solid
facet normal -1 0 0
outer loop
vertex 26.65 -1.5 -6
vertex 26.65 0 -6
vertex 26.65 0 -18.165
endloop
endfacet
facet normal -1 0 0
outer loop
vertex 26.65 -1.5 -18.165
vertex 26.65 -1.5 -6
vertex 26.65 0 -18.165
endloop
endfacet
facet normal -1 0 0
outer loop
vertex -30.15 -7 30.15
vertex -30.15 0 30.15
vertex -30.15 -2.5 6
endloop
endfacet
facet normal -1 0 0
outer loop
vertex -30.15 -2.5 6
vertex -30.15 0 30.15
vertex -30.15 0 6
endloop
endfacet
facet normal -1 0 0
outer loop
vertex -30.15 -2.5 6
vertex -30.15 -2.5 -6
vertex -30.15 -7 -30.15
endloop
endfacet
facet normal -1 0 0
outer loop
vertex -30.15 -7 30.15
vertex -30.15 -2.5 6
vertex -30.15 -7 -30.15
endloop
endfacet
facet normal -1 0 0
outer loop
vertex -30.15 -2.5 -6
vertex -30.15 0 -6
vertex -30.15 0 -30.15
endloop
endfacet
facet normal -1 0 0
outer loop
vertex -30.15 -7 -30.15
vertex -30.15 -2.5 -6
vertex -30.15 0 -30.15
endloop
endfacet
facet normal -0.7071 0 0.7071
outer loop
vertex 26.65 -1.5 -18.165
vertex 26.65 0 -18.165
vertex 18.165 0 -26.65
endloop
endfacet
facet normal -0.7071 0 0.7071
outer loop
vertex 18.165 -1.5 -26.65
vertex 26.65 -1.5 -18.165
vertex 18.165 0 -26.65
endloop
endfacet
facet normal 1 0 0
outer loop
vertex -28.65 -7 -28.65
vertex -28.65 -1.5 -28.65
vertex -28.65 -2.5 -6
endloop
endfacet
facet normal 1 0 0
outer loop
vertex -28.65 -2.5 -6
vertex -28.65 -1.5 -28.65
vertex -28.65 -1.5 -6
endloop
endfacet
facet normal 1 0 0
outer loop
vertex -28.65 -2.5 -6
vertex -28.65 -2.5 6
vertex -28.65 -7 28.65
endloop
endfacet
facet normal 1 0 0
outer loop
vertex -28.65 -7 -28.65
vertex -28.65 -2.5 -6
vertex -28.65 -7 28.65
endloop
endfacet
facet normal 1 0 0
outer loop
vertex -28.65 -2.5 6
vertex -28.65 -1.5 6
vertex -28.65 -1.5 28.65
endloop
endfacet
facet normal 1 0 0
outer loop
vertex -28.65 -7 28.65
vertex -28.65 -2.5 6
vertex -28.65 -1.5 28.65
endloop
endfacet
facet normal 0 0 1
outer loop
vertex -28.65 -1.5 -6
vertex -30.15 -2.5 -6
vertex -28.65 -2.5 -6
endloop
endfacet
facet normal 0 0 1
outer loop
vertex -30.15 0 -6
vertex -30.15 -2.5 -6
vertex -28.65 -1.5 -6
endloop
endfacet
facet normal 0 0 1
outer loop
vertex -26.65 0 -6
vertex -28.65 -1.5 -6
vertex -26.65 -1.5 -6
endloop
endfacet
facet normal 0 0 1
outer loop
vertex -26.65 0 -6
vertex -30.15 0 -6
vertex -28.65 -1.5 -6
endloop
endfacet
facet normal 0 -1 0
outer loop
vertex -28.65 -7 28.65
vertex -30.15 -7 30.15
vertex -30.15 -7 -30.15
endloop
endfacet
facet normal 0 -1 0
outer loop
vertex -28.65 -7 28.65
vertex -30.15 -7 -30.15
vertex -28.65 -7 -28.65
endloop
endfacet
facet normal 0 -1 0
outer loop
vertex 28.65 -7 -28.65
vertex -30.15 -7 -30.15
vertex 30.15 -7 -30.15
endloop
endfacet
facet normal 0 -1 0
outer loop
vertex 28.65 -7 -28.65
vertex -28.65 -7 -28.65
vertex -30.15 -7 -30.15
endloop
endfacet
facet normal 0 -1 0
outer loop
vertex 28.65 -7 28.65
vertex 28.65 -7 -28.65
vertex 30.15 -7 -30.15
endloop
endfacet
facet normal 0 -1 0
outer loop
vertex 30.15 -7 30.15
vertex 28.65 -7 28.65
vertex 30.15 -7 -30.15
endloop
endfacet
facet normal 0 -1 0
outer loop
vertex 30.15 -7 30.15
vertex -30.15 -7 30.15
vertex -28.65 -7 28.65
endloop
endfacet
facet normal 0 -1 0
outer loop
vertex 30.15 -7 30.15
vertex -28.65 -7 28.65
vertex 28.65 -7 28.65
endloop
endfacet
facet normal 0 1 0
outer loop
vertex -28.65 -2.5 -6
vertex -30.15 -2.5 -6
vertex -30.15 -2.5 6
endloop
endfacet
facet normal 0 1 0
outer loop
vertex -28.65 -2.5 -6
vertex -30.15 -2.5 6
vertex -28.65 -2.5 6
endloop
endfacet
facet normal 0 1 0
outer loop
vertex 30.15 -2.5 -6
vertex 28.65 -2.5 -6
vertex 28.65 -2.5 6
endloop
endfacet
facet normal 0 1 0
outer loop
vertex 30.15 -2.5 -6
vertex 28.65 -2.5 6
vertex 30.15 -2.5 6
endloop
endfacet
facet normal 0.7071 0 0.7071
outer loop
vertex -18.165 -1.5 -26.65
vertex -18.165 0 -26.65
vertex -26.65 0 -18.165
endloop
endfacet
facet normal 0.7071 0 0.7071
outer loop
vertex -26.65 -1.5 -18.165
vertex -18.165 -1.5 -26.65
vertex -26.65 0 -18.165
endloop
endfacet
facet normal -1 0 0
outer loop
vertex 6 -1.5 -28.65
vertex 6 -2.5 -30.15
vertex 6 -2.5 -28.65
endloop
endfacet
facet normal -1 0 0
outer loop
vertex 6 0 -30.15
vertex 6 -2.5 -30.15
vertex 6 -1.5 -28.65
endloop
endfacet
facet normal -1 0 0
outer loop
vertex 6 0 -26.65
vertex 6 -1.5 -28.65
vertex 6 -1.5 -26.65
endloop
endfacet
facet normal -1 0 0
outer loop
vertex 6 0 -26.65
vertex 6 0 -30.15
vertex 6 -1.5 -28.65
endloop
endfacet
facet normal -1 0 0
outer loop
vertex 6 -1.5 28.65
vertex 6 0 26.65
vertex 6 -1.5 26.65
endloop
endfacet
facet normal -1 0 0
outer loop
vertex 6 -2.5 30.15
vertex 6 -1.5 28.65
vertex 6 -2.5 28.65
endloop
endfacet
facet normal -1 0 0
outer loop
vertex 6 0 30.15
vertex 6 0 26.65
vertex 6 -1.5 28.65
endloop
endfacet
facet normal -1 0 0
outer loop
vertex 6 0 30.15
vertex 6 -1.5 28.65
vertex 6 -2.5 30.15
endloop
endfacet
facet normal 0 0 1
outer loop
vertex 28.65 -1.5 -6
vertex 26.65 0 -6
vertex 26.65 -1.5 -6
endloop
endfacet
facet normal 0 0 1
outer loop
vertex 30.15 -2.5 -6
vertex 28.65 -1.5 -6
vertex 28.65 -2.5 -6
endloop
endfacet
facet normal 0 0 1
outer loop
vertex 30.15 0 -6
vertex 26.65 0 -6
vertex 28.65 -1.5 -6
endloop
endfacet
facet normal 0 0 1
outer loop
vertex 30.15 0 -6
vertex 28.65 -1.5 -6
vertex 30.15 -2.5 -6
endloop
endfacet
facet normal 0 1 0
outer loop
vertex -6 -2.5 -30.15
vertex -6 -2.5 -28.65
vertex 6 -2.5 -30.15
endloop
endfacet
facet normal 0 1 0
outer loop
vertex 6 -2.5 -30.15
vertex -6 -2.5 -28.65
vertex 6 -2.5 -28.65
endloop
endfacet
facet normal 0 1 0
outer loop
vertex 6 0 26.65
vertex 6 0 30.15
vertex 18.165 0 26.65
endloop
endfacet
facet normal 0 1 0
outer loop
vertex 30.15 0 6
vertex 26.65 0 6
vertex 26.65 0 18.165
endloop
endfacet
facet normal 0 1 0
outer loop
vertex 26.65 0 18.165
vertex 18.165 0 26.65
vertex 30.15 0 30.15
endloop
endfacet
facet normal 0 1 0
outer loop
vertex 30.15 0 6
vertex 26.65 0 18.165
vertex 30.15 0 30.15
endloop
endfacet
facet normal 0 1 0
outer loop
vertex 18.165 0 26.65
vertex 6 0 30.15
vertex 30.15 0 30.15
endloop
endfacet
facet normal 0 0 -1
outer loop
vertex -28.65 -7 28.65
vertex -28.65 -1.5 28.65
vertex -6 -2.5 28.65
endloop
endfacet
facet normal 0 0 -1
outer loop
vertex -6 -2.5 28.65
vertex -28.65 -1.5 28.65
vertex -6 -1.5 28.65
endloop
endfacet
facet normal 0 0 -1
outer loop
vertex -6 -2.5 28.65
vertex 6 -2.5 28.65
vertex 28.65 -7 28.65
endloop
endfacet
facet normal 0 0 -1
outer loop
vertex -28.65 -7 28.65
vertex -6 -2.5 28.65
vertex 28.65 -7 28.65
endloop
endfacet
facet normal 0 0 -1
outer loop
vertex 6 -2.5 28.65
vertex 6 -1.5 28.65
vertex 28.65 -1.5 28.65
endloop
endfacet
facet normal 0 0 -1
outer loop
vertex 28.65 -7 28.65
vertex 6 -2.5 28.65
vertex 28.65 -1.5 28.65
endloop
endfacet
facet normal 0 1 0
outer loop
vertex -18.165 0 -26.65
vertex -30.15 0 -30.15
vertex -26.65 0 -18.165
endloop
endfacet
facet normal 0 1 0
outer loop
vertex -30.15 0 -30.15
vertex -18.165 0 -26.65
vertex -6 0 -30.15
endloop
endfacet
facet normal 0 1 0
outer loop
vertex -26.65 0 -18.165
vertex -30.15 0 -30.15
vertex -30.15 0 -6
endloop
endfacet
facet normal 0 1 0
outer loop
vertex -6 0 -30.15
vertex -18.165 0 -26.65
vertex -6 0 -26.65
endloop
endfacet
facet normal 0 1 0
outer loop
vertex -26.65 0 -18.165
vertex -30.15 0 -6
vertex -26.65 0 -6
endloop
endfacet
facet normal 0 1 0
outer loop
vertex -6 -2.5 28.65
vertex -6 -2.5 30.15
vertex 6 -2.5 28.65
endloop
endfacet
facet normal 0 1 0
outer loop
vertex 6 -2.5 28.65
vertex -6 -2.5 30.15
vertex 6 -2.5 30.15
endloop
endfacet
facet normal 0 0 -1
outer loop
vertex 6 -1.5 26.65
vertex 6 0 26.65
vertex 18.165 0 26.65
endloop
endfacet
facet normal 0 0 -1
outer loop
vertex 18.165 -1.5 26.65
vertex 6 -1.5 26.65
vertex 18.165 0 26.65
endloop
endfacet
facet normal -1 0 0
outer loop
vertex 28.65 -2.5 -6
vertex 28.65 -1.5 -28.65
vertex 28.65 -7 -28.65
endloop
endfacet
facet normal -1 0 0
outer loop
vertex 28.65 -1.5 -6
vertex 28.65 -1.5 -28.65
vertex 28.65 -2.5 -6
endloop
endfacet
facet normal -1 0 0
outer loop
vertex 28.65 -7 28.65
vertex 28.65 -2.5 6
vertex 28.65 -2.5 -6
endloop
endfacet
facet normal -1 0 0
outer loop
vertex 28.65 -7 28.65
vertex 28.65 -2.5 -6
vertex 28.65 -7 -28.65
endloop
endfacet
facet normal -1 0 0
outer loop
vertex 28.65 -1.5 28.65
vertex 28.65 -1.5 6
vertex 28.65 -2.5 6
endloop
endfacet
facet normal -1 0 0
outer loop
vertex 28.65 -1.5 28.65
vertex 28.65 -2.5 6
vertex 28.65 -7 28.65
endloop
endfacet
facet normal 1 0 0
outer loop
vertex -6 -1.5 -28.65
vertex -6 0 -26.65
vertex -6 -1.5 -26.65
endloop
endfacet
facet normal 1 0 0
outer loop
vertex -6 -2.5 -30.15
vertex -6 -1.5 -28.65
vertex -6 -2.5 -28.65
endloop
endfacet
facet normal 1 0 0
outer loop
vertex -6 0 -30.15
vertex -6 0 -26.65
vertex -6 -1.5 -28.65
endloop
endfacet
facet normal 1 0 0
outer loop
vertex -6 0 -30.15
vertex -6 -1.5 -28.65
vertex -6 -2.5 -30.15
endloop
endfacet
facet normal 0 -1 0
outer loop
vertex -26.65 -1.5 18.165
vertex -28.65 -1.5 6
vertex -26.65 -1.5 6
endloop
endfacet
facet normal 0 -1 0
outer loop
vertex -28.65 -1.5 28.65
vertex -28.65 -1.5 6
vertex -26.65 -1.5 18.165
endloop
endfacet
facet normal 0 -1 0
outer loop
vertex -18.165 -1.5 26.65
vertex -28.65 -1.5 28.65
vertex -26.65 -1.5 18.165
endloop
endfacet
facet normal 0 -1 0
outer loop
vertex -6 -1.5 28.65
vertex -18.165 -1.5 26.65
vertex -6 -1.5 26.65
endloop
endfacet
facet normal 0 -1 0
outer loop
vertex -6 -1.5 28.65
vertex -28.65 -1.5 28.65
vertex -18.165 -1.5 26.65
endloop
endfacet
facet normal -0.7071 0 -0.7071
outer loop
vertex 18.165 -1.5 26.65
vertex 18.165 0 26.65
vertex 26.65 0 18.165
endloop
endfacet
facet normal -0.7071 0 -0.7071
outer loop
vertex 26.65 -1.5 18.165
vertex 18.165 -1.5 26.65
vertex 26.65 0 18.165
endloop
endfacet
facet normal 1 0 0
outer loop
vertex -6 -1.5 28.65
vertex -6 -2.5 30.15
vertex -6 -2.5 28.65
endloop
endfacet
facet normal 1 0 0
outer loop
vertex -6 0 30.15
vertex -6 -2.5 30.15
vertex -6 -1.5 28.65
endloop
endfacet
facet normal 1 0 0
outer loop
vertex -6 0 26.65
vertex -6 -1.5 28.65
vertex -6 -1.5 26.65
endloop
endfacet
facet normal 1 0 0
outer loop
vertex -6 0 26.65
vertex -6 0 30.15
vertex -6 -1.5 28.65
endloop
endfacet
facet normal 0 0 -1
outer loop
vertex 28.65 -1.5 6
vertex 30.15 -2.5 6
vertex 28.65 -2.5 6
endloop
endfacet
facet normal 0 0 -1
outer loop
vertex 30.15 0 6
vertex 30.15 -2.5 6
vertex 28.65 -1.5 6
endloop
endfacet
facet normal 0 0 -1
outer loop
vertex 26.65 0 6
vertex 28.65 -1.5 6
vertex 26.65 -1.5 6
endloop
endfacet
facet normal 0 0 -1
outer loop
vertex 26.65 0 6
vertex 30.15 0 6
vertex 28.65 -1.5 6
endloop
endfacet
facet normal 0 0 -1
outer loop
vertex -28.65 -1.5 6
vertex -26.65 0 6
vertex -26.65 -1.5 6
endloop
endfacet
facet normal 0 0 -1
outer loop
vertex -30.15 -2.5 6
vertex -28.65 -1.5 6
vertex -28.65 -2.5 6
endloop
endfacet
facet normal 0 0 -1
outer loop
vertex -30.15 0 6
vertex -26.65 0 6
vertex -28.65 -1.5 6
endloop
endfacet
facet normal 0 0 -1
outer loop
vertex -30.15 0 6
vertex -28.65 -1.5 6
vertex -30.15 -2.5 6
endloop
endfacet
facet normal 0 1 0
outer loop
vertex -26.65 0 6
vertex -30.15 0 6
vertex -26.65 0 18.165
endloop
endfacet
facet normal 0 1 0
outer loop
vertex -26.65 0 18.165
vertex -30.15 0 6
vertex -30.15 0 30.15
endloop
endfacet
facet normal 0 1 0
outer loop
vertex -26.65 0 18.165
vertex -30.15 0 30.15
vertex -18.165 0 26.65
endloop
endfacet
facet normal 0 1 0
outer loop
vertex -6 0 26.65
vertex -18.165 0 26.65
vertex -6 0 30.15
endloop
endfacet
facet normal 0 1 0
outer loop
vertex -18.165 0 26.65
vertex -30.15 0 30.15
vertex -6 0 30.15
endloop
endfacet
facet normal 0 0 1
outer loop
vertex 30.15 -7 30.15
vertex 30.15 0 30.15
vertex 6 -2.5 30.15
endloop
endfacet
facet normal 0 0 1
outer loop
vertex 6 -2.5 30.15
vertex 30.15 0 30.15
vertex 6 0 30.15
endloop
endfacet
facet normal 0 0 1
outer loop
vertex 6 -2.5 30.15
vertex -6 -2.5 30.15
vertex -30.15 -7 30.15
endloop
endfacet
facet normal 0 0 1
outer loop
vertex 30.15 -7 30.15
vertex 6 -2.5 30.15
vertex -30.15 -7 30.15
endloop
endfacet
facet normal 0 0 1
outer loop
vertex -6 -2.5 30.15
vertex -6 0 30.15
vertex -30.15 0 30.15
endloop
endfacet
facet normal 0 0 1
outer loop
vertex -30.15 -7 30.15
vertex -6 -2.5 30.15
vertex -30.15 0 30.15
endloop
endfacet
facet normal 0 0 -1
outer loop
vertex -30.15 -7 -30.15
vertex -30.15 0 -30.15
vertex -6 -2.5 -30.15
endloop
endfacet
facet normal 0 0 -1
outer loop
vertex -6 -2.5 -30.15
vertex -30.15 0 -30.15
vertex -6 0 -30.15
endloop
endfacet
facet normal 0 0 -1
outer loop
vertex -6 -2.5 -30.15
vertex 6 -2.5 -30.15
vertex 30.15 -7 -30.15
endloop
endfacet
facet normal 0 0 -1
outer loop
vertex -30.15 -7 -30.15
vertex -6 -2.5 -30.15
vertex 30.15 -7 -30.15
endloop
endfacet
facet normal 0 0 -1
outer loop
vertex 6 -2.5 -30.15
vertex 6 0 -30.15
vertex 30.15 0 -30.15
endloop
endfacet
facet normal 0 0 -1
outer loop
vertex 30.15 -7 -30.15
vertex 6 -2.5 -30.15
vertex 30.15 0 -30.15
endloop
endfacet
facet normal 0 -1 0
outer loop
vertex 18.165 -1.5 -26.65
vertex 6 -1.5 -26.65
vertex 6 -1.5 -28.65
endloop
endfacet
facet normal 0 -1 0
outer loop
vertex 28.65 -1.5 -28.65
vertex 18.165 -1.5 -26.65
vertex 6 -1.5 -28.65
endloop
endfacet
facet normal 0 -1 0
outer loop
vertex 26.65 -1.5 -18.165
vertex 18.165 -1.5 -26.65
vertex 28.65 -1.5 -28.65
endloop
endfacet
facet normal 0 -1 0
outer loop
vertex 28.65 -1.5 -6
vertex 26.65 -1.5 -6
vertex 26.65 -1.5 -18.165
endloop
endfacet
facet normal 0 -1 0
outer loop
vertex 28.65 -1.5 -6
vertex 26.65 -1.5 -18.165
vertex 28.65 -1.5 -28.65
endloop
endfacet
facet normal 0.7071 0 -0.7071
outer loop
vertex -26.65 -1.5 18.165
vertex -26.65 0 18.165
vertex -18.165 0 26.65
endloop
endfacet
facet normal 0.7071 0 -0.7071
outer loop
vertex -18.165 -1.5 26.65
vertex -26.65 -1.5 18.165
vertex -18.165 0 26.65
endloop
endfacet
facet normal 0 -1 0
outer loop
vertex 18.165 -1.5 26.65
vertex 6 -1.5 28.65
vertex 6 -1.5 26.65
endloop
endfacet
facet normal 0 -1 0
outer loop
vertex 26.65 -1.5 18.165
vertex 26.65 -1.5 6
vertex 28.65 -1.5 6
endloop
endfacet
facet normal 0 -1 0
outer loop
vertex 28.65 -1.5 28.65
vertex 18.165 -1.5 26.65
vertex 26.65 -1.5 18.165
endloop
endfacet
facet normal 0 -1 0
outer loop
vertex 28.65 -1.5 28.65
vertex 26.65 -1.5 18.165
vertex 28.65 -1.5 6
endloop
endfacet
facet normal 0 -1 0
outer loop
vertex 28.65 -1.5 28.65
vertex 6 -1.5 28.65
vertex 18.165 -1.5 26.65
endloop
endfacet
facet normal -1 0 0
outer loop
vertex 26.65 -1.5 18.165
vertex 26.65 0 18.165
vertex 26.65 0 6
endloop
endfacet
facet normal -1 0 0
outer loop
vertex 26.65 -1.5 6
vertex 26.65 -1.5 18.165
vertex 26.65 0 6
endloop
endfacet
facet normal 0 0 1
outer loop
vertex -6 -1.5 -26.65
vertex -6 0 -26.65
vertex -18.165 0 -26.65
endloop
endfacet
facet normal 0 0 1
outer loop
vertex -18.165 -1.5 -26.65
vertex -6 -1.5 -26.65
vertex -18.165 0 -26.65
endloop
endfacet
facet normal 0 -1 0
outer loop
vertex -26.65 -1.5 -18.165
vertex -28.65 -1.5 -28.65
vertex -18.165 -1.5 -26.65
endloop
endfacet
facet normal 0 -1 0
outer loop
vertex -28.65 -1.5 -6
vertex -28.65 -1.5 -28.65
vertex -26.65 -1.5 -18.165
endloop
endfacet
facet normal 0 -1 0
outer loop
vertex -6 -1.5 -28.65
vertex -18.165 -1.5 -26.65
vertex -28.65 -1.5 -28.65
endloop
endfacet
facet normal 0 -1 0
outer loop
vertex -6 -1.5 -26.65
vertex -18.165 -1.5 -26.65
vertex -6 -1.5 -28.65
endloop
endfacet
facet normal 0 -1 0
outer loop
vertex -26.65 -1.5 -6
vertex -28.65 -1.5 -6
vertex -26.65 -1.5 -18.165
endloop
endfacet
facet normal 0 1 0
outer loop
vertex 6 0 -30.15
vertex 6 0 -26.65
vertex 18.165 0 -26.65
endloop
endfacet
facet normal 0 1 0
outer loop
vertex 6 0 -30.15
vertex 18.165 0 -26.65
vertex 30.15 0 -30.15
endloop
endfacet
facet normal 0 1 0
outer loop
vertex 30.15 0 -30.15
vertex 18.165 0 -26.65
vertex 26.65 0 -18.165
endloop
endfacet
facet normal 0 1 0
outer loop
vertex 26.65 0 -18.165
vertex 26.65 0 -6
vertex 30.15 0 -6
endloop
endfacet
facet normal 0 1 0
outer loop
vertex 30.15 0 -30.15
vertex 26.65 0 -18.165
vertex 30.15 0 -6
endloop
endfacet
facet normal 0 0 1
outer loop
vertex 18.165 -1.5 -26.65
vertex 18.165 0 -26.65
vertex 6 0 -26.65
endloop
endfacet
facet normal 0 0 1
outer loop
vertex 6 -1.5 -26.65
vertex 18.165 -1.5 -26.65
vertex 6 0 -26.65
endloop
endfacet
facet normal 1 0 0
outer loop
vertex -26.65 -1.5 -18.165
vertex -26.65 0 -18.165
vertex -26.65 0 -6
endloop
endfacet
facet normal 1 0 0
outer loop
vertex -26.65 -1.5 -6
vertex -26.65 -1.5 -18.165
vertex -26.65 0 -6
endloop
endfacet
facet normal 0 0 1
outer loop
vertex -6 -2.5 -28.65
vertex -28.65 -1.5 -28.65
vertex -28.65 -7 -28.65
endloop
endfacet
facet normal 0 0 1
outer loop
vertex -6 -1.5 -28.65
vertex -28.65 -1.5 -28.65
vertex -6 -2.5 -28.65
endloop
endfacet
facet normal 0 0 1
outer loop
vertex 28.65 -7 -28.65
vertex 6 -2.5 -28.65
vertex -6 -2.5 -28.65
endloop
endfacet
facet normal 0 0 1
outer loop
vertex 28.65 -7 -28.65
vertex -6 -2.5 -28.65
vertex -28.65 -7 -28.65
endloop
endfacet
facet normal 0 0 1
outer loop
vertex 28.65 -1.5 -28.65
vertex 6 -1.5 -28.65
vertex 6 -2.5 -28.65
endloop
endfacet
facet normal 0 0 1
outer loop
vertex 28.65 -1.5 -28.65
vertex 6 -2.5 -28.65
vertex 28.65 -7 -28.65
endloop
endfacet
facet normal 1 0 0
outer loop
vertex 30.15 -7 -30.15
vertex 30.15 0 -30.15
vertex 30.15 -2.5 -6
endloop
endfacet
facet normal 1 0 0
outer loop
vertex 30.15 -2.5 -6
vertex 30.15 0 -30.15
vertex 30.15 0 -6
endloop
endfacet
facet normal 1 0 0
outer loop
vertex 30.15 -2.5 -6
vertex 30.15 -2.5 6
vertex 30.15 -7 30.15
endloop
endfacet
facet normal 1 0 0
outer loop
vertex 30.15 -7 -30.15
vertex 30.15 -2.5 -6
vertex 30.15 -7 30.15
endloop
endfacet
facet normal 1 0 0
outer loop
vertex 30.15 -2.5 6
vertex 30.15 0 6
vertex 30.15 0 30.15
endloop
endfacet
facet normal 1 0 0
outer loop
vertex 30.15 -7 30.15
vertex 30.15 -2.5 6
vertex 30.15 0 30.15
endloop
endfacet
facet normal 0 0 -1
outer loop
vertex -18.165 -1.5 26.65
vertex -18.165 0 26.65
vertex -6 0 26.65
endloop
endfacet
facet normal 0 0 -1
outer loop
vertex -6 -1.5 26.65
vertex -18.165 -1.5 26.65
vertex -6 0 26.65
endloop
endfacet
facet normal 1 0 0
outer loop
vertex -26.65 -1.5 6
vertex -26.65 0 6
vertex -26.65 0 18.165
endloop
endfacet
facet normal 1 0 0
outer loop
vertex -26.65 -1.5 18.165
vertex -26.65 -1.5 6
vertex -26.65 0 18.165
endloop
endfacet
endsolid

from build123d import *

# Parameters (mm, degrees)
F0_W     = 57.3
F0_H     = 57.3
F1_DEPTH = 1.5
F2_W     = 57.3
F2_H     = 57.3
F3_DEPTH = 7
F5_DEPTH = 2.5


with BuildPart() as f1:
    # F0 (on Front) → F1 (new body)
    with BuildSketch(Plane.XZ):
        Rectangle(F0_W, F0_H)
        Polygon((-18.164719, 26.65), (18.164719, 26.65), (26.65, 18.164719), (26.65, -18.164719), (18.164719, -26.65), (-18.164719, -26.65), (-26.65, -18.164719), (-26.65, 18.164719), align=None, mode=Mode.SUBTRACT)
    extrude(amount=F1_DEPTH)

    # F2 (on Front) → F3 (join)
    with BuildSketch(Plane.XZ):
        Polygon((28.65, 30.15), (-28.65, 30.15), (-30.15, 30.15), (-30.15, 28.65), (-30.15, -28.65), (-30.15, -30.15), (-28.65, -30.15), (28.65, -30.15), (30.15, -30.15), (30.15, -28.65), (30.15, 28.65), (30.15, 30.15), align=None)
        Rectangle(F2_W, F2_H, mode=Mode.SUBTRACT)
    extrude(amount=F3_DEPTH)

    # F4 (on Front) → F5 (cut)
    with BuildSketch(Plane.XZ):
        Polygon((25.578076, 6), (25.578076, 0), (25.578076, -6), (33.948865, -6), (33.948865, 6), align=None)
        Polygon((-6, 33.948865), (-6, 25.578076), (0, 25.578076), (6, 25.578076), (6, 33.948865), align=None)
        Polygon((-33.948865, -6), (-25.578076, -6), (-25.578076, 0), (-25.578076, 6), (-33.948865, 6), align=None)
        Polygon((6, -33.948865), (6, -25.578076), (0, -25.578076), (-6, -25.578076), (-6, -33.948865), align=None)
    extrude(amount=F5_DEPTH, mode=Mode.SUBTRACT)


solid = f1.part
